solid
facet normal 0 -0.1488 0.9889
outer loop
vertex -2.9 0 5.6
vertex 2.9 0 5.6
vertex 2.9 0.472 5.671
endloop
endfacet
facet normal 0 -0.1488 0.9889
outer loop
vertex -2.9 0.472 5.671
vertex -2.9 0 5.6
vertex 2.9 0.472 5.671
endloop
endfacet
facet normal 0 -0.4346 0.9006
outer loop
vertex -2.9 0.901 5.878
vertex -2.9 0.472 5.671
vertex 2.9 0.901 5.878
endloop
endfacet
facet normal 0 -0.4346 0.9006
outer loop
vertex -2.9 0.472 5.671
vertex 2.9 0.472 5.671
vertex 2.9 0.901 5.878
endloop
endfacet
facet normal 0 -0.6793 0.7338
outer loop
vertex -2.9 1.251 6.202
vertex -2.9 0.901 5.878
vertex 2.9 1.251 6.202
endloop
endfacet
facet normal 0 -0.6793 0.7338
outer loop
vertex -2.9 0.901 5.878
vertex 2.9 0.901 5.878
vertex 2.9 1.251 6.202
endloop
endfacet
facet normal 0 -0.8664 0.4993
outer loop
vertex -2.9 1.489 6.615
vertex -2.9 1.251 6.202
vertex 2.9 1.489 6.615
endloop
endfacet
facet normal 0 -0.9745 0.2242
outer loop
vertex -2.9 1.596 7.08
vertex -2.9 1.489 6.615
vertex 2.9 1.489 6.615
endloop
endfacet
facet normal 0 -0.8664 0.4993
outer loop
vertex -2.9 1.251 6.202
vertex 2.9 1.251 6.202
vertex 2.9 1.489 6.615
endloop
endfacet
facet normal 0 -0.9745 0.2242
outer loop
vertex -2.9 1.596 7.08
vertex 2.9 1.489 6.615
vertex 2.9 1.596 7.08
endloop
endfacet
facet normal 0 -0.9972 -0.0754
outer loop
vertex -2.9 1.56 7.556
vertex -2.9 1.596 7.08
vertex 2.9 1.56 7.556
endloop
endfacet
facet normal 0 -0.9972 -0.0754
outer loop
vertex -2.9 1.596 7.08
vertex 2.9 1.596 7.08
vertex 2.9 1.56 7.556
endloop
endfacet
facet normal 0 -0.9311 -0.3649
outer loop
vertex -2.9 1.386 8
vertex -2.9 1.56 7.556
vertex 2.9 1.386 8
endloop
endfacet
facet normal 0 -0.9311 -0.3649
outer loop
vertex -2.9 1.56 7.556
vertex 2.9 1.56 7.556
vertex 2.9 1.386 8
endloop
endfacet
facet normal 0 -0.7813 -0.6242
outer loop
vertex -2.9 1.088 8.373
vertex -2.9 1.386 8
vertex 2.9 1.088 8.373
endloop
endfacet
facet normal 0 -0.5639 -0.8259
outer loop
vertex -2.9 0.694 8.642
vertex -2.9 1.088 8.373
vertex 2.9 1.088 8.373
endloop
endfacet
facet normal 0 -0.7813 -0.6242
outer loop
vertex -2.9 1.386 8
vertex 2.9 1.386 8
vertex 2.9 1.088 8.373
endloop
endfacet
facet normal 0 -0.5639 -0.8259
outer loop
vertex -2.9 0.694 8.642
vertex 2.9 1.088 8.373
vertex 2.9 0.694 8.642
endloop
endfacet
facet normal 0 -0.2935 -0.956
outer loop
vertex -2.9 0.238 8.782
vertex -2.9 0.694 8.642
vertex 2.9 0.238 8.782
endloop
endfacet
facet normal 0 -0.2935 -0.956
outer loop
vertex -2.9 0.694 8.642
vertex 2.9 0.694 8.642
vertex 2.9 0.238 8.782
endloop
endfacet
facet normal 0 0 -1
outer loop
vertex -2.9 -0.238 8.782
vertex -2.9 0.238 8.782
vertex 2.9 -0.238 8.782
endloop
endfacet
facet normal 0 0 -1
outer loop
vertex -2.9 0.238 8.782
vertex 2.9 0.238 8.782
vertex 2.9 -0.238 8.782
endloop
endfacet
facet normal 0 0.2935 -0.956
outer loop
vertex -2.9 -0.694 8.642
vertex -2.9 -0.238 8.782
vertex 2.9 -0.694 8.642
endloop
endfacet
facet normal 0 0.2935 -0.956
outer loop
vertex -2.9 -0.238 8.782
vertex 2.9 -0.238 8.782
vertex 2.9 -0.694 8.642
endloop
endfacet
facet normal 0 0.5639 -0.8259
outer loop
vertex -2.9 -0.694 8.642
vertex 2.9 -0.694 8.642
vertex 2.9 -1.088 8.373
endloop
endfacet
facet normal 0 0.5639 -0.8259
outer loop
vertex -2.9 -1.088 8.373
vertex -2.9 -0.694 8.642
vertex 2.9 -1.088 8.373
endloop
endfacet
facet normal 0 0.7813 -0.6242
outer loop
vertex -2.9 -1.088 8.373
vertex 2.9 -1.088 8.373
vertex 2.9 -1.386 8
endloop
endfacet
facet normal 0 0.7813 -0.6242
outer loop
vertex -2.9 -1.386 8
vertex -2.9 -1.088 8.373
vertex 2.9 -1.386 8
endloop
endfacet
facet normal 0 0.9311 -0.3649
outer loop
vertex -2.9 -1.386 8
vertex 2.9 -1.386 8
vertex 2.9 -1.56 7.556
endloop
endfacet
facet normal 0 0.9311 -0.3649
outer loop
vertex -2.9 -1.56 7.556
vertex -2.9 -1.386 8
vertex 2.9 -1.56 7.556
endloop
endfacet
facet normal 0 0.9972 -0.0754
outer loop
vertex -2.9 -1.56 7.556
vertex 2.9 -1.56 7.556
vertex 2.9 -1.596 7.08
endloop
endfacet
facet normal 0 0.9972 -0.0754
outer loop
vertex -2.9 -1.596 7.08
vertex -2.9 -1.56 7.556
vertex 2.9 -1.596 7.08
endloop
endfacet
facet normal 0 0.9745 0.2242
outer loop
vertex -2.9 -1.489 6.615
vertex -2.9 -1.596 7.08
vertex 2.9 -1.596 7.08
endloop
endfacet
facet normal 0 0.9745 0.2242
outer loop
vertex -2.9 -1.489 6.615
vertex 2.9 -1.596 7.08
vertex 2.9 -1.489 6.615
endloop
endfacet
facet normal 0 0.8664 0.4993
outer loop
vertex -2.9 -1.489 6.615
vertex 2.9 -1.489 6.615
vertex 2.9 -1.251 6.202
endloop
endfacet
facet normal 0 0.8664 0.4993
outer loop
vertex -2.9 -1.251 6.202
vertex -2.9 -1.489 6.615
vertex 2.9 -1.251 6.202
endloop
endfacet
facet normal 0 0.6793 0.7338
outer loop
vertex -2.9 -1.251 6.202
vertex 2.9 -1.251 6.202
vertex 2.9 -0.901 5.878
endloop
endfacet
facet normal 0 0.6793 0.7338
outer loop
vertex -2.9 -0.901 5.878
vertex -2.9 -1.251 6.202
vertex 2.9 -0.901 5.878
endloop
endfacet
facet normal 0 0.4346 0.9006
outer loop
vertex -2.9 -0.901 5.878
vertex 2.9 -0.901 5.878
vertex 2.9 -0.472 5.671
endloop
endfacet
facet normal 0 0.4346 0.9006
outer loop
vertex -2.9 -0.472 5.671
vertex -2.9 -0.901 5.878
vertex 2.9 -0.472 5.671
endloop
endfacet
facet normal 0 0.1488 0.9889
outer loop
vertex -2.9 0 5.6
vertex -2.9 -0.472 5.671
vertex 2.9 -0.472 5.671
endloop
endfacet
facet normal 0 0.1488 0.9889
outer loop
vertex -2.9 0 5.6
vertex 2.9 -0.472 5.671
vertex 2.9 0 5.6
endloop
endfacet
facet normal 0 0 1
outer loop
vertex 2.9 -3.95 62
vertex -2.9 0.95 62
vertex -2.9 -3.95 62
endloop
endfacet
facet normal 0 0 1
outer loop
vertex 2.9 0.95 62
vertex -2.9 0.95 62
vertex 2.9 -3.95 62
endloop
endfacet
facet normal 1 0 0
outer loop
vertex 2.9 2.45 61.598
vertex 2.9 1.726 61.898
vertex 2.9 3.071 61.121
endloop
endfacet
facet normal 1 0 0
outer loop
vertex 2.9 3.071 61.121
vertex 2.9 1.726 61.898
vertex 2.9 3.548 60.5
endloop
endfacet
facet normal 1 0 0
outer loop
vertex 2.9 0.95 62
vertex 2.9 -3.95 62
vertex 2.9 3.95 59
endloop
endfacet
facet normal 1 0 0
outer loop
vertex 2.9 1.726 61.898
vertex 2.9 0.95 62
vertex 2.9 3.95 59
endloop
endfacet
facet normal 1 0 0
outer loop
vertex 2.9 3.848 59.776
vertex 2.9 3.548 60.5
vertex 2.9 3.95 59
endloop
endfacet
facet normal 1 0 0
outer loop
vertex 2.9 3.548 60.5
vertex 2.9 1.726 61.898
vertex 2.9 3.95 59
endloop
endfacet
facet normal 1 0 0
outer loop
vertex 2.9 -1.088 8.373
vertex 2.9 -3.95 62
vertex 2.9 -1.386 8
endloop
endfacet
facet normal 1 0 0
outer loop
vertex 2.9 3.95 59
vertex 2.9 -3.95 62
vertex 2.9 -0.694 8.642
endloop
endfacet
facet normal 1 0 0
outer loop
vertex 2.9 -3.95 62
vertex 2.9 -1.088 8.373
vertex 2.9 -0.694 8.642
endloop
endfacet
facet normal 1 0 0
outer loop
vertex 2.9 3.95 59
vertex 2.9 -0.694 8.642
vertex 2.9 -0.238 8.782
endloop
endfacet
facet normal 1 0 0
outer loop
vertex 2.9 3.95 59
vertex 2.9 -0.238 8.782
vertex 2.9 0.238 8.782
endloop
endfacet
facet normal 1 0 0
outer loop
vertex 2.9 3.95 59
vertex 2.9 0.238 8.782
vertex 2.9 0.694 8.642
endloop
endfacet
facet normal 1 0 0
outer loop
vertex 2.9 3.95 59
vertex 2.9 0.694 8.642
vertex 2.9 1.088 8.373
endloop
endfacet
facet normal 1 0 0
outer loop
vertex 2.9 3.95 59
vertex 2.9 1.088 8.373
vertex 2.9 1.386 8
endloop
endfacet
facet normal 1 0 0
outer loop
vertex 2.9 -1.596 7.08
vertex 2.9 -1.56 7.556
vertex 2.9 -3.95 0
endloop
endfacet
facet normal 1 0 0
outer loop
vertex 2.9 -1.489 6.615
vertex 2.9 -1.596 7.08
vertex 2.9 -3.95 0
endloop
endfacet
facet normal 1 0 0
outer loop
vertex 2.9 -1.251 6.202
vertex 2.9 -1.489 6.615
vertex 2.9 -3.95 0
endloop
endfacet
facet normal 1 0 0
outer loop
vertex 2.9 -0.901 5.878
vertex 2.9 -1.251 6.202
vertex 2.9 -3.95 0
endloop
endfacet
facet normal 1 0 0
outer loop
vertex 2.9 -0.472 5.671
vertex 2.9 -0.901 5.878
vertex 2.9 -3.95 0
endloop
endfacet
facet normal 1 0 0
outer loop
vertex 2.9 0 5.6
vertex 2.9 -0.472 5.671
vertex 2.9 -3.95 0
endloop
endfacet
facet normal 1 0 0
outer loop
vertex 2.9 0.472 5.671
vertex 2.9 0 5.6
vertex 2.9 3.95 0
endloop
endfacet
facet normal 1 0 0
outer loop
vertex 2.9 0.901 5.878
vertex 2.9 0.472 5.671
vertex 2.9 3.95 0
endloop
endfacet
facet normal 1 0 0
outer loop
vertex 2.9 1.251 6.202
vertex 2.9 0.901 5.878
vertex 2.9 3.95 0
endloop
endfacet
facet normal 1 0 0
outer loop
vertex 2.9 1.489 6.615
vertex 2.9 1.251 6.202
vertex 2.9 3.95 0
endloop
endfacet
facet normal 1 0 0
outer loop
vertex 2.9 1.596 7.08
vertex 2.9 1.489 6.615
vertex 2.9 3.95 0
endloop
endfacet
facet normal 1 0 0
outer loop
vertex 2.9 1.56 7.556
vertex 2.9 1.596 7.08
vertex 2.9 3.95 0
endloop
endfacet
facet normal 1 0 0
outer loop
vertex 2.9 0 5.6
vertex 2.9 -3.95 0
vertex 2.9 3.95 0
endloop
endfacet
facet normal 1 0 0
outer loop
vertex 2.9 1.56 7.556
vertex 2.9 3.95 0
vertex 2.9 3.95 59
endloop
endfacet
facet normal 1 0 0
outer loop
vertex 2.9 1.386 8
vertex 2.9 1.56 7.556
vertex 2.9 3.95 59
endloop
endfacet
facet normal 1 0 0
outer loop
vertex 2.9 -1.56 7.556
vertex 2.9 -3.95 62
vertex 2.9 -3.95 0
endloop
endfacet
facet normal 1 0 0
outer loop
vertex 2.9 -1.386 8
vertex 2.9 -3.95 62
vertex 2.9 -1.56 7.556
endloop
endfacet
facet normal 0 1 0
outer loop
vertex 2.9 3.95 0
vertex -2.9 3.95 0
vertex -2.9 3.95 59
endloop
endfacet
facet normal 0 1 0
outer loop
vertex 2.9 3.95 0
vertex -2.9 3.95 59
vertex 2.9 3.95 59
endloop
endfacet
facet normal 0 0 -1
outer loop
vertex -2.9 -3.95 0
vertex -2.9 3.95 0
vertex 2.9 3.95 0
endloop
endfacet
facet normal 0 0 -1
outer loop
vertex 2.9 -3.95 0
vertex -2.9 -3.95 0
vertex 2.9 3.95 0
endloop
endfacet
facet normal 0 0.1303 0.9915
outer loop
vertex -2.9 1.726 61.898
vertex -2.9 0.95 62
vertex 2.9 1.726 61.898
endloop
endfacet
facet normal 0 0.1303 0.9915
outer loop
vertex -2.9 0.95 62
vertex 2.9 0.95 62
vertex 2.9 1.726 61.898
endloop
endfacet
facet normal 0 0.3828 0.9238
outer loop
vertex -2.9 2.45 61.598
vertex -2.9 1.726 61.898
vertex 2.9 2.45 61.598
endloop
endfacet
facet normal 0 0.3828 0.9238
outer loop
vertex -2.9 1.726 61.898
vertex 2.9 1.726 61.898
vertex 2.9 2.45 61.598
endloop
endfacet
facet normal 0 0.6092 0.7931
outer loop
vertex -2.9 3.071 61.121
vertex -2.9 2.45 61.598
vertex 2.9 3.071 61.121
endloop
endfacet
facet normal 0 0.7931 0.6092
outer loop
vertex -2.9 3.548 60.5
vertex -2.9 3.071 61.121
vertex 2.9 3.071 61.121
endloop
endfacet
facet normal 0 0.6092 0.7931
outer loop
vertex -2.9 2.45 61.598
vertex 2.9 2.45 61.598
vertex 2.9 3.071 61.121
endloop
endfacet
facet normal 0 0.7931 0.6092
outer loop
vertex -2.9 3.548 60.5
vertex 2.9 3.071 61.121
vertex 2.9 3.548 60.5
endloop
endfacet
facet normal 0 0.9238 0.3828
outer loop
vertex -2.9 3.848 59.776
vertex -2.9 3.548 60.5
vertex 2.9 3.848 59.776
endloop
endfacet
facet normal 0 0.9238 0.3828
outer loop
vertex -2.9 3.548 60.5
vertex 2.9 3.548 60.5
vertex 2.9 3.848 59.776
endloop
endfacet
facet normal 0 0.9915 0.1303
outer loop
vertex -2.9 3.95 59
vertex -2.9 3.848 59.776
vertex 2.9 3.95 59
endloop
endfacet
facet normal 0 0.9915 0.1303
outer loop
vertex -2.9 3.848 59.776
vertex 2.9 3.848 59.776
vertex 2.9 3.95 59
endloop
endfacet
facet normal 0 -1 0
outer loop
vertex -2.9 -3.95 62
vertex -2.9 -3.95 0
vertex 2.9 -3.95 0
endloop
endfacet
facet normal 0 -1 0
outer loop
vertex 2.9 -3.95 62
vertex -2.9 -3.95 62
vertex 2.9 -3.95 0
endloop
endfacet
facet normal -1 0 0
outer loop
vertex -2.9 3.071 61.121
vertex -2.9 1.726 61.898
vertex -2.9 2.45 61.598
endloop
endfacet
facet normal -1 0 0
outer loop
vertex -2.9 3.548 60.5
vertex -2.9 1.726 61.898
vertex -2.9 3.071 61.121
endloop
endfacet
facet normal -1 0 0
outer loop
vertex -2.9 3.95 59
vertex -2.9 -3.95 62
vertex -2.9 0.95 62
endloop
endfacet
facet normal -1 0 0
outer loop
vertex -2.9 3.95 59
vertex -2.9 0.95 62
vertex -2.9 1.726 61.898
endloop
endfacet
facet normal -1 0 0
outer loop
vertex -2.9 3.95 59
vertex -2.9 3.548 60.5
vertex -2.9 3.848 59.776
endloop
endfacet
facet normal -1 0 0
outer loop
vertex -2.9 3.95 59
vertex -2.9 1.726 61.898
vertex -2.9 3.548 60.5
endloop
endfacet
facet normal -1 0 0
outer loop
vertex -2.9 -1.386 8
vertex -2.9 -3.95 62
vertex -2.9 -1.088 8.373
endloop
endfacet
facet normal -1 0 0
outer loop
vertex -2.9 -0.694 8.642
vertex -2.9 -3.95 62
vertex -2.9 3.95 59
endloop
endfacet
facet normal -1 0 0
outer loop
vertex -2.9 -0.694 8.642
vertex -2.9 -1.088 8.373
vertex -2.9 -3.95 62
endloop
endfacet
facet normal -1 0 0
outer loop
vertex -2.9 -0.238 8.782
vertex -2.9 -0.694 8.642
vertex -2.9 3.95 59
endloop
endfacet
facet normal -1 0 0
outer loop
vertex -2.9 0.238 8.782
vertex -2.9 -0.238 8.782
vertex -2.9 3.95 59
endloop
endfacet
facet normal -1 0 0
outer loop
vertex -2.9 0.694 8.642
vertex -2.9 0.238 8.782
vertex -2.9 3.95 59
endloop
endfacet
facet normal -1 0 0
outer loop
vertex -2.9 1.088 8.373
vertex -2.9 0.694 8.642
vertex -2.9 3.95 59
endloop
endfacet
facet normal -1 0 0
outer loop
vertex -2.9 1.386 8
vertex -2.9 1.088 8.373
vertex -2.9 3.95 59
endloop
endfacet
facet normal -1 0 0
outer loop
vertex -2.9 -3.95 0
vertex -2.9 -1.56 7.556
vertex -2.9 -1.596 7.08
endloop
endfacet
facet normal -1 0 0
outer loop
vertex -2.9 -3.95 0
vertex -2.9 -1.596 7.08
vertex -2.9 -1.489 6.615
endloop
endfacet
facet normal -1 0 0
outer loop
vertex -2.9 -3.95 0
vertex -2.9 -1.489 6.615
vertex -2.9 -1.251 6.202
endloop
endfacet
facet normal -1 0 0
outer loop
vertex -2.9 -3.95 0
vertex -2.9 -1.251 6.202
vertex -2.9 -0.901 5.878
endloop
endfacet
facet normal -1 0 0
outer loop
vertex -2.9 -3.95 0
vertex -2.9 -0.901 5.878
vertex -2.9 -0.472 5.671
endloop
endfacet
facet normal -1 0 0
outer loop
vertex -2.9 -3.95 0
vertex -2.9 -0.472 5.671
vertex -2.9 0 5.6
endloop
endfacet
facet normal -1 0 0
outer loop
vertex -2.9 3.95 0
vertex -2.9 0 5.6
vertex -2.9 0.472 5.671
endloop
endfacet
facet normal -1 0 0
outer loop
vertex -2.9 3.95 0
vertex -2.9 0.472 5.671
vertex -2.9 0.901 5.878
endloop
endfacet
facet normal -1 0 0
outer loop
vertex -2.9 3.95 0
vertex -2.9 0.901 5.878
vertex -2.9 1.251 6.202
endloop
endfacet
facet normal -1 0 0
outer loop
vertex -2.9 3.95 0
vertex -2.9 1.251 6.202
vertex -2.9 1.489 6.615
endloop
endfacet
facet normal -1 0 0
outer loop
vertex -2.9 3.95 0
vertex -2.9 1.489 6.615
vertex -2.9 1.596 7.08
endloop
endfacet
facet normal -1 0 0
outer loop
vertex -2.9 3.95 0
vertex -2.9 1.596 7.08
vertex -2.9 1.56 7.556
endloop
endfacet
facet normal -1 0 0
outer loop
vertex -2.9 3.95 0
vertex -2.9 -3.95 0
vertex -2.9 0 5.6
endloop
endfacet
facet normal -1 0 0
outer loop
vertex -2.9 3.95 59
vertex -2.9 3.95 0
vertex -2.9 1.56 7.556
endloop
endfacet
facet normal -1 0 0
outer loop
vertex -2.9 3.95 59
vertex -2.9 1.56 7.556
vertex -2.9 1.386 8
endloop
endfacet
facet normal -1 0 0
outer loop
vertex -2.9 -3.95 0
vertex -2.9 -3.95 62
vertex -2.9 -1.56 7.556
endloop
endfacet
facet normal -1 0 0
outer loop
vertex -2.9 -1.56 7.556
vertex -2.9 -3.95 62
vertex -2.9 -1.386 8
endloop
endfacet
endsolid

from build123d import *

# Parameters (mm, degrees)
SKETCH1_W           = 5.8
SKETCH1_H           = 7.9
BOSS_EXTRUDE1_DEPTH = 62
SKETCH2_R           = 1.6
CUT_EXTRUDE1_DEPTH  = 6.8
FILLET1_R           = 3


with BuildPart() as part:
    # Sketch1 → Boss-Extrude1 (new body)
    with BuildSketch(Plane.XY):
        Rectangle(SKETCH1_W, SKETCH1_H)
    extrude(amount=BOSS_EXTRUDE1_DEPTH)

    # Sketch2 → Cut-Extrude1 (cut, through all)
    with BuildSketch(Plane(origin=(2.9, 0, 0), x_dir=(0, 0, -1), z_dir=(1, 0, 0))):
        with Locations((-7.2, 0)):
            Circle(SKETCH2_R)
    extrude(amount=-CUT_EXTRUDE1_DEPTH, mode=Mode.SUBTRACT)

    # Fillet1
    fillet1_edges = [part.edges().sort_by_distance(p)[0] for p in [
        (0, 3.95, 62),
    ]]
    fillet(fillet1_edges, radius=FILLET1_R)


solid = part.part
